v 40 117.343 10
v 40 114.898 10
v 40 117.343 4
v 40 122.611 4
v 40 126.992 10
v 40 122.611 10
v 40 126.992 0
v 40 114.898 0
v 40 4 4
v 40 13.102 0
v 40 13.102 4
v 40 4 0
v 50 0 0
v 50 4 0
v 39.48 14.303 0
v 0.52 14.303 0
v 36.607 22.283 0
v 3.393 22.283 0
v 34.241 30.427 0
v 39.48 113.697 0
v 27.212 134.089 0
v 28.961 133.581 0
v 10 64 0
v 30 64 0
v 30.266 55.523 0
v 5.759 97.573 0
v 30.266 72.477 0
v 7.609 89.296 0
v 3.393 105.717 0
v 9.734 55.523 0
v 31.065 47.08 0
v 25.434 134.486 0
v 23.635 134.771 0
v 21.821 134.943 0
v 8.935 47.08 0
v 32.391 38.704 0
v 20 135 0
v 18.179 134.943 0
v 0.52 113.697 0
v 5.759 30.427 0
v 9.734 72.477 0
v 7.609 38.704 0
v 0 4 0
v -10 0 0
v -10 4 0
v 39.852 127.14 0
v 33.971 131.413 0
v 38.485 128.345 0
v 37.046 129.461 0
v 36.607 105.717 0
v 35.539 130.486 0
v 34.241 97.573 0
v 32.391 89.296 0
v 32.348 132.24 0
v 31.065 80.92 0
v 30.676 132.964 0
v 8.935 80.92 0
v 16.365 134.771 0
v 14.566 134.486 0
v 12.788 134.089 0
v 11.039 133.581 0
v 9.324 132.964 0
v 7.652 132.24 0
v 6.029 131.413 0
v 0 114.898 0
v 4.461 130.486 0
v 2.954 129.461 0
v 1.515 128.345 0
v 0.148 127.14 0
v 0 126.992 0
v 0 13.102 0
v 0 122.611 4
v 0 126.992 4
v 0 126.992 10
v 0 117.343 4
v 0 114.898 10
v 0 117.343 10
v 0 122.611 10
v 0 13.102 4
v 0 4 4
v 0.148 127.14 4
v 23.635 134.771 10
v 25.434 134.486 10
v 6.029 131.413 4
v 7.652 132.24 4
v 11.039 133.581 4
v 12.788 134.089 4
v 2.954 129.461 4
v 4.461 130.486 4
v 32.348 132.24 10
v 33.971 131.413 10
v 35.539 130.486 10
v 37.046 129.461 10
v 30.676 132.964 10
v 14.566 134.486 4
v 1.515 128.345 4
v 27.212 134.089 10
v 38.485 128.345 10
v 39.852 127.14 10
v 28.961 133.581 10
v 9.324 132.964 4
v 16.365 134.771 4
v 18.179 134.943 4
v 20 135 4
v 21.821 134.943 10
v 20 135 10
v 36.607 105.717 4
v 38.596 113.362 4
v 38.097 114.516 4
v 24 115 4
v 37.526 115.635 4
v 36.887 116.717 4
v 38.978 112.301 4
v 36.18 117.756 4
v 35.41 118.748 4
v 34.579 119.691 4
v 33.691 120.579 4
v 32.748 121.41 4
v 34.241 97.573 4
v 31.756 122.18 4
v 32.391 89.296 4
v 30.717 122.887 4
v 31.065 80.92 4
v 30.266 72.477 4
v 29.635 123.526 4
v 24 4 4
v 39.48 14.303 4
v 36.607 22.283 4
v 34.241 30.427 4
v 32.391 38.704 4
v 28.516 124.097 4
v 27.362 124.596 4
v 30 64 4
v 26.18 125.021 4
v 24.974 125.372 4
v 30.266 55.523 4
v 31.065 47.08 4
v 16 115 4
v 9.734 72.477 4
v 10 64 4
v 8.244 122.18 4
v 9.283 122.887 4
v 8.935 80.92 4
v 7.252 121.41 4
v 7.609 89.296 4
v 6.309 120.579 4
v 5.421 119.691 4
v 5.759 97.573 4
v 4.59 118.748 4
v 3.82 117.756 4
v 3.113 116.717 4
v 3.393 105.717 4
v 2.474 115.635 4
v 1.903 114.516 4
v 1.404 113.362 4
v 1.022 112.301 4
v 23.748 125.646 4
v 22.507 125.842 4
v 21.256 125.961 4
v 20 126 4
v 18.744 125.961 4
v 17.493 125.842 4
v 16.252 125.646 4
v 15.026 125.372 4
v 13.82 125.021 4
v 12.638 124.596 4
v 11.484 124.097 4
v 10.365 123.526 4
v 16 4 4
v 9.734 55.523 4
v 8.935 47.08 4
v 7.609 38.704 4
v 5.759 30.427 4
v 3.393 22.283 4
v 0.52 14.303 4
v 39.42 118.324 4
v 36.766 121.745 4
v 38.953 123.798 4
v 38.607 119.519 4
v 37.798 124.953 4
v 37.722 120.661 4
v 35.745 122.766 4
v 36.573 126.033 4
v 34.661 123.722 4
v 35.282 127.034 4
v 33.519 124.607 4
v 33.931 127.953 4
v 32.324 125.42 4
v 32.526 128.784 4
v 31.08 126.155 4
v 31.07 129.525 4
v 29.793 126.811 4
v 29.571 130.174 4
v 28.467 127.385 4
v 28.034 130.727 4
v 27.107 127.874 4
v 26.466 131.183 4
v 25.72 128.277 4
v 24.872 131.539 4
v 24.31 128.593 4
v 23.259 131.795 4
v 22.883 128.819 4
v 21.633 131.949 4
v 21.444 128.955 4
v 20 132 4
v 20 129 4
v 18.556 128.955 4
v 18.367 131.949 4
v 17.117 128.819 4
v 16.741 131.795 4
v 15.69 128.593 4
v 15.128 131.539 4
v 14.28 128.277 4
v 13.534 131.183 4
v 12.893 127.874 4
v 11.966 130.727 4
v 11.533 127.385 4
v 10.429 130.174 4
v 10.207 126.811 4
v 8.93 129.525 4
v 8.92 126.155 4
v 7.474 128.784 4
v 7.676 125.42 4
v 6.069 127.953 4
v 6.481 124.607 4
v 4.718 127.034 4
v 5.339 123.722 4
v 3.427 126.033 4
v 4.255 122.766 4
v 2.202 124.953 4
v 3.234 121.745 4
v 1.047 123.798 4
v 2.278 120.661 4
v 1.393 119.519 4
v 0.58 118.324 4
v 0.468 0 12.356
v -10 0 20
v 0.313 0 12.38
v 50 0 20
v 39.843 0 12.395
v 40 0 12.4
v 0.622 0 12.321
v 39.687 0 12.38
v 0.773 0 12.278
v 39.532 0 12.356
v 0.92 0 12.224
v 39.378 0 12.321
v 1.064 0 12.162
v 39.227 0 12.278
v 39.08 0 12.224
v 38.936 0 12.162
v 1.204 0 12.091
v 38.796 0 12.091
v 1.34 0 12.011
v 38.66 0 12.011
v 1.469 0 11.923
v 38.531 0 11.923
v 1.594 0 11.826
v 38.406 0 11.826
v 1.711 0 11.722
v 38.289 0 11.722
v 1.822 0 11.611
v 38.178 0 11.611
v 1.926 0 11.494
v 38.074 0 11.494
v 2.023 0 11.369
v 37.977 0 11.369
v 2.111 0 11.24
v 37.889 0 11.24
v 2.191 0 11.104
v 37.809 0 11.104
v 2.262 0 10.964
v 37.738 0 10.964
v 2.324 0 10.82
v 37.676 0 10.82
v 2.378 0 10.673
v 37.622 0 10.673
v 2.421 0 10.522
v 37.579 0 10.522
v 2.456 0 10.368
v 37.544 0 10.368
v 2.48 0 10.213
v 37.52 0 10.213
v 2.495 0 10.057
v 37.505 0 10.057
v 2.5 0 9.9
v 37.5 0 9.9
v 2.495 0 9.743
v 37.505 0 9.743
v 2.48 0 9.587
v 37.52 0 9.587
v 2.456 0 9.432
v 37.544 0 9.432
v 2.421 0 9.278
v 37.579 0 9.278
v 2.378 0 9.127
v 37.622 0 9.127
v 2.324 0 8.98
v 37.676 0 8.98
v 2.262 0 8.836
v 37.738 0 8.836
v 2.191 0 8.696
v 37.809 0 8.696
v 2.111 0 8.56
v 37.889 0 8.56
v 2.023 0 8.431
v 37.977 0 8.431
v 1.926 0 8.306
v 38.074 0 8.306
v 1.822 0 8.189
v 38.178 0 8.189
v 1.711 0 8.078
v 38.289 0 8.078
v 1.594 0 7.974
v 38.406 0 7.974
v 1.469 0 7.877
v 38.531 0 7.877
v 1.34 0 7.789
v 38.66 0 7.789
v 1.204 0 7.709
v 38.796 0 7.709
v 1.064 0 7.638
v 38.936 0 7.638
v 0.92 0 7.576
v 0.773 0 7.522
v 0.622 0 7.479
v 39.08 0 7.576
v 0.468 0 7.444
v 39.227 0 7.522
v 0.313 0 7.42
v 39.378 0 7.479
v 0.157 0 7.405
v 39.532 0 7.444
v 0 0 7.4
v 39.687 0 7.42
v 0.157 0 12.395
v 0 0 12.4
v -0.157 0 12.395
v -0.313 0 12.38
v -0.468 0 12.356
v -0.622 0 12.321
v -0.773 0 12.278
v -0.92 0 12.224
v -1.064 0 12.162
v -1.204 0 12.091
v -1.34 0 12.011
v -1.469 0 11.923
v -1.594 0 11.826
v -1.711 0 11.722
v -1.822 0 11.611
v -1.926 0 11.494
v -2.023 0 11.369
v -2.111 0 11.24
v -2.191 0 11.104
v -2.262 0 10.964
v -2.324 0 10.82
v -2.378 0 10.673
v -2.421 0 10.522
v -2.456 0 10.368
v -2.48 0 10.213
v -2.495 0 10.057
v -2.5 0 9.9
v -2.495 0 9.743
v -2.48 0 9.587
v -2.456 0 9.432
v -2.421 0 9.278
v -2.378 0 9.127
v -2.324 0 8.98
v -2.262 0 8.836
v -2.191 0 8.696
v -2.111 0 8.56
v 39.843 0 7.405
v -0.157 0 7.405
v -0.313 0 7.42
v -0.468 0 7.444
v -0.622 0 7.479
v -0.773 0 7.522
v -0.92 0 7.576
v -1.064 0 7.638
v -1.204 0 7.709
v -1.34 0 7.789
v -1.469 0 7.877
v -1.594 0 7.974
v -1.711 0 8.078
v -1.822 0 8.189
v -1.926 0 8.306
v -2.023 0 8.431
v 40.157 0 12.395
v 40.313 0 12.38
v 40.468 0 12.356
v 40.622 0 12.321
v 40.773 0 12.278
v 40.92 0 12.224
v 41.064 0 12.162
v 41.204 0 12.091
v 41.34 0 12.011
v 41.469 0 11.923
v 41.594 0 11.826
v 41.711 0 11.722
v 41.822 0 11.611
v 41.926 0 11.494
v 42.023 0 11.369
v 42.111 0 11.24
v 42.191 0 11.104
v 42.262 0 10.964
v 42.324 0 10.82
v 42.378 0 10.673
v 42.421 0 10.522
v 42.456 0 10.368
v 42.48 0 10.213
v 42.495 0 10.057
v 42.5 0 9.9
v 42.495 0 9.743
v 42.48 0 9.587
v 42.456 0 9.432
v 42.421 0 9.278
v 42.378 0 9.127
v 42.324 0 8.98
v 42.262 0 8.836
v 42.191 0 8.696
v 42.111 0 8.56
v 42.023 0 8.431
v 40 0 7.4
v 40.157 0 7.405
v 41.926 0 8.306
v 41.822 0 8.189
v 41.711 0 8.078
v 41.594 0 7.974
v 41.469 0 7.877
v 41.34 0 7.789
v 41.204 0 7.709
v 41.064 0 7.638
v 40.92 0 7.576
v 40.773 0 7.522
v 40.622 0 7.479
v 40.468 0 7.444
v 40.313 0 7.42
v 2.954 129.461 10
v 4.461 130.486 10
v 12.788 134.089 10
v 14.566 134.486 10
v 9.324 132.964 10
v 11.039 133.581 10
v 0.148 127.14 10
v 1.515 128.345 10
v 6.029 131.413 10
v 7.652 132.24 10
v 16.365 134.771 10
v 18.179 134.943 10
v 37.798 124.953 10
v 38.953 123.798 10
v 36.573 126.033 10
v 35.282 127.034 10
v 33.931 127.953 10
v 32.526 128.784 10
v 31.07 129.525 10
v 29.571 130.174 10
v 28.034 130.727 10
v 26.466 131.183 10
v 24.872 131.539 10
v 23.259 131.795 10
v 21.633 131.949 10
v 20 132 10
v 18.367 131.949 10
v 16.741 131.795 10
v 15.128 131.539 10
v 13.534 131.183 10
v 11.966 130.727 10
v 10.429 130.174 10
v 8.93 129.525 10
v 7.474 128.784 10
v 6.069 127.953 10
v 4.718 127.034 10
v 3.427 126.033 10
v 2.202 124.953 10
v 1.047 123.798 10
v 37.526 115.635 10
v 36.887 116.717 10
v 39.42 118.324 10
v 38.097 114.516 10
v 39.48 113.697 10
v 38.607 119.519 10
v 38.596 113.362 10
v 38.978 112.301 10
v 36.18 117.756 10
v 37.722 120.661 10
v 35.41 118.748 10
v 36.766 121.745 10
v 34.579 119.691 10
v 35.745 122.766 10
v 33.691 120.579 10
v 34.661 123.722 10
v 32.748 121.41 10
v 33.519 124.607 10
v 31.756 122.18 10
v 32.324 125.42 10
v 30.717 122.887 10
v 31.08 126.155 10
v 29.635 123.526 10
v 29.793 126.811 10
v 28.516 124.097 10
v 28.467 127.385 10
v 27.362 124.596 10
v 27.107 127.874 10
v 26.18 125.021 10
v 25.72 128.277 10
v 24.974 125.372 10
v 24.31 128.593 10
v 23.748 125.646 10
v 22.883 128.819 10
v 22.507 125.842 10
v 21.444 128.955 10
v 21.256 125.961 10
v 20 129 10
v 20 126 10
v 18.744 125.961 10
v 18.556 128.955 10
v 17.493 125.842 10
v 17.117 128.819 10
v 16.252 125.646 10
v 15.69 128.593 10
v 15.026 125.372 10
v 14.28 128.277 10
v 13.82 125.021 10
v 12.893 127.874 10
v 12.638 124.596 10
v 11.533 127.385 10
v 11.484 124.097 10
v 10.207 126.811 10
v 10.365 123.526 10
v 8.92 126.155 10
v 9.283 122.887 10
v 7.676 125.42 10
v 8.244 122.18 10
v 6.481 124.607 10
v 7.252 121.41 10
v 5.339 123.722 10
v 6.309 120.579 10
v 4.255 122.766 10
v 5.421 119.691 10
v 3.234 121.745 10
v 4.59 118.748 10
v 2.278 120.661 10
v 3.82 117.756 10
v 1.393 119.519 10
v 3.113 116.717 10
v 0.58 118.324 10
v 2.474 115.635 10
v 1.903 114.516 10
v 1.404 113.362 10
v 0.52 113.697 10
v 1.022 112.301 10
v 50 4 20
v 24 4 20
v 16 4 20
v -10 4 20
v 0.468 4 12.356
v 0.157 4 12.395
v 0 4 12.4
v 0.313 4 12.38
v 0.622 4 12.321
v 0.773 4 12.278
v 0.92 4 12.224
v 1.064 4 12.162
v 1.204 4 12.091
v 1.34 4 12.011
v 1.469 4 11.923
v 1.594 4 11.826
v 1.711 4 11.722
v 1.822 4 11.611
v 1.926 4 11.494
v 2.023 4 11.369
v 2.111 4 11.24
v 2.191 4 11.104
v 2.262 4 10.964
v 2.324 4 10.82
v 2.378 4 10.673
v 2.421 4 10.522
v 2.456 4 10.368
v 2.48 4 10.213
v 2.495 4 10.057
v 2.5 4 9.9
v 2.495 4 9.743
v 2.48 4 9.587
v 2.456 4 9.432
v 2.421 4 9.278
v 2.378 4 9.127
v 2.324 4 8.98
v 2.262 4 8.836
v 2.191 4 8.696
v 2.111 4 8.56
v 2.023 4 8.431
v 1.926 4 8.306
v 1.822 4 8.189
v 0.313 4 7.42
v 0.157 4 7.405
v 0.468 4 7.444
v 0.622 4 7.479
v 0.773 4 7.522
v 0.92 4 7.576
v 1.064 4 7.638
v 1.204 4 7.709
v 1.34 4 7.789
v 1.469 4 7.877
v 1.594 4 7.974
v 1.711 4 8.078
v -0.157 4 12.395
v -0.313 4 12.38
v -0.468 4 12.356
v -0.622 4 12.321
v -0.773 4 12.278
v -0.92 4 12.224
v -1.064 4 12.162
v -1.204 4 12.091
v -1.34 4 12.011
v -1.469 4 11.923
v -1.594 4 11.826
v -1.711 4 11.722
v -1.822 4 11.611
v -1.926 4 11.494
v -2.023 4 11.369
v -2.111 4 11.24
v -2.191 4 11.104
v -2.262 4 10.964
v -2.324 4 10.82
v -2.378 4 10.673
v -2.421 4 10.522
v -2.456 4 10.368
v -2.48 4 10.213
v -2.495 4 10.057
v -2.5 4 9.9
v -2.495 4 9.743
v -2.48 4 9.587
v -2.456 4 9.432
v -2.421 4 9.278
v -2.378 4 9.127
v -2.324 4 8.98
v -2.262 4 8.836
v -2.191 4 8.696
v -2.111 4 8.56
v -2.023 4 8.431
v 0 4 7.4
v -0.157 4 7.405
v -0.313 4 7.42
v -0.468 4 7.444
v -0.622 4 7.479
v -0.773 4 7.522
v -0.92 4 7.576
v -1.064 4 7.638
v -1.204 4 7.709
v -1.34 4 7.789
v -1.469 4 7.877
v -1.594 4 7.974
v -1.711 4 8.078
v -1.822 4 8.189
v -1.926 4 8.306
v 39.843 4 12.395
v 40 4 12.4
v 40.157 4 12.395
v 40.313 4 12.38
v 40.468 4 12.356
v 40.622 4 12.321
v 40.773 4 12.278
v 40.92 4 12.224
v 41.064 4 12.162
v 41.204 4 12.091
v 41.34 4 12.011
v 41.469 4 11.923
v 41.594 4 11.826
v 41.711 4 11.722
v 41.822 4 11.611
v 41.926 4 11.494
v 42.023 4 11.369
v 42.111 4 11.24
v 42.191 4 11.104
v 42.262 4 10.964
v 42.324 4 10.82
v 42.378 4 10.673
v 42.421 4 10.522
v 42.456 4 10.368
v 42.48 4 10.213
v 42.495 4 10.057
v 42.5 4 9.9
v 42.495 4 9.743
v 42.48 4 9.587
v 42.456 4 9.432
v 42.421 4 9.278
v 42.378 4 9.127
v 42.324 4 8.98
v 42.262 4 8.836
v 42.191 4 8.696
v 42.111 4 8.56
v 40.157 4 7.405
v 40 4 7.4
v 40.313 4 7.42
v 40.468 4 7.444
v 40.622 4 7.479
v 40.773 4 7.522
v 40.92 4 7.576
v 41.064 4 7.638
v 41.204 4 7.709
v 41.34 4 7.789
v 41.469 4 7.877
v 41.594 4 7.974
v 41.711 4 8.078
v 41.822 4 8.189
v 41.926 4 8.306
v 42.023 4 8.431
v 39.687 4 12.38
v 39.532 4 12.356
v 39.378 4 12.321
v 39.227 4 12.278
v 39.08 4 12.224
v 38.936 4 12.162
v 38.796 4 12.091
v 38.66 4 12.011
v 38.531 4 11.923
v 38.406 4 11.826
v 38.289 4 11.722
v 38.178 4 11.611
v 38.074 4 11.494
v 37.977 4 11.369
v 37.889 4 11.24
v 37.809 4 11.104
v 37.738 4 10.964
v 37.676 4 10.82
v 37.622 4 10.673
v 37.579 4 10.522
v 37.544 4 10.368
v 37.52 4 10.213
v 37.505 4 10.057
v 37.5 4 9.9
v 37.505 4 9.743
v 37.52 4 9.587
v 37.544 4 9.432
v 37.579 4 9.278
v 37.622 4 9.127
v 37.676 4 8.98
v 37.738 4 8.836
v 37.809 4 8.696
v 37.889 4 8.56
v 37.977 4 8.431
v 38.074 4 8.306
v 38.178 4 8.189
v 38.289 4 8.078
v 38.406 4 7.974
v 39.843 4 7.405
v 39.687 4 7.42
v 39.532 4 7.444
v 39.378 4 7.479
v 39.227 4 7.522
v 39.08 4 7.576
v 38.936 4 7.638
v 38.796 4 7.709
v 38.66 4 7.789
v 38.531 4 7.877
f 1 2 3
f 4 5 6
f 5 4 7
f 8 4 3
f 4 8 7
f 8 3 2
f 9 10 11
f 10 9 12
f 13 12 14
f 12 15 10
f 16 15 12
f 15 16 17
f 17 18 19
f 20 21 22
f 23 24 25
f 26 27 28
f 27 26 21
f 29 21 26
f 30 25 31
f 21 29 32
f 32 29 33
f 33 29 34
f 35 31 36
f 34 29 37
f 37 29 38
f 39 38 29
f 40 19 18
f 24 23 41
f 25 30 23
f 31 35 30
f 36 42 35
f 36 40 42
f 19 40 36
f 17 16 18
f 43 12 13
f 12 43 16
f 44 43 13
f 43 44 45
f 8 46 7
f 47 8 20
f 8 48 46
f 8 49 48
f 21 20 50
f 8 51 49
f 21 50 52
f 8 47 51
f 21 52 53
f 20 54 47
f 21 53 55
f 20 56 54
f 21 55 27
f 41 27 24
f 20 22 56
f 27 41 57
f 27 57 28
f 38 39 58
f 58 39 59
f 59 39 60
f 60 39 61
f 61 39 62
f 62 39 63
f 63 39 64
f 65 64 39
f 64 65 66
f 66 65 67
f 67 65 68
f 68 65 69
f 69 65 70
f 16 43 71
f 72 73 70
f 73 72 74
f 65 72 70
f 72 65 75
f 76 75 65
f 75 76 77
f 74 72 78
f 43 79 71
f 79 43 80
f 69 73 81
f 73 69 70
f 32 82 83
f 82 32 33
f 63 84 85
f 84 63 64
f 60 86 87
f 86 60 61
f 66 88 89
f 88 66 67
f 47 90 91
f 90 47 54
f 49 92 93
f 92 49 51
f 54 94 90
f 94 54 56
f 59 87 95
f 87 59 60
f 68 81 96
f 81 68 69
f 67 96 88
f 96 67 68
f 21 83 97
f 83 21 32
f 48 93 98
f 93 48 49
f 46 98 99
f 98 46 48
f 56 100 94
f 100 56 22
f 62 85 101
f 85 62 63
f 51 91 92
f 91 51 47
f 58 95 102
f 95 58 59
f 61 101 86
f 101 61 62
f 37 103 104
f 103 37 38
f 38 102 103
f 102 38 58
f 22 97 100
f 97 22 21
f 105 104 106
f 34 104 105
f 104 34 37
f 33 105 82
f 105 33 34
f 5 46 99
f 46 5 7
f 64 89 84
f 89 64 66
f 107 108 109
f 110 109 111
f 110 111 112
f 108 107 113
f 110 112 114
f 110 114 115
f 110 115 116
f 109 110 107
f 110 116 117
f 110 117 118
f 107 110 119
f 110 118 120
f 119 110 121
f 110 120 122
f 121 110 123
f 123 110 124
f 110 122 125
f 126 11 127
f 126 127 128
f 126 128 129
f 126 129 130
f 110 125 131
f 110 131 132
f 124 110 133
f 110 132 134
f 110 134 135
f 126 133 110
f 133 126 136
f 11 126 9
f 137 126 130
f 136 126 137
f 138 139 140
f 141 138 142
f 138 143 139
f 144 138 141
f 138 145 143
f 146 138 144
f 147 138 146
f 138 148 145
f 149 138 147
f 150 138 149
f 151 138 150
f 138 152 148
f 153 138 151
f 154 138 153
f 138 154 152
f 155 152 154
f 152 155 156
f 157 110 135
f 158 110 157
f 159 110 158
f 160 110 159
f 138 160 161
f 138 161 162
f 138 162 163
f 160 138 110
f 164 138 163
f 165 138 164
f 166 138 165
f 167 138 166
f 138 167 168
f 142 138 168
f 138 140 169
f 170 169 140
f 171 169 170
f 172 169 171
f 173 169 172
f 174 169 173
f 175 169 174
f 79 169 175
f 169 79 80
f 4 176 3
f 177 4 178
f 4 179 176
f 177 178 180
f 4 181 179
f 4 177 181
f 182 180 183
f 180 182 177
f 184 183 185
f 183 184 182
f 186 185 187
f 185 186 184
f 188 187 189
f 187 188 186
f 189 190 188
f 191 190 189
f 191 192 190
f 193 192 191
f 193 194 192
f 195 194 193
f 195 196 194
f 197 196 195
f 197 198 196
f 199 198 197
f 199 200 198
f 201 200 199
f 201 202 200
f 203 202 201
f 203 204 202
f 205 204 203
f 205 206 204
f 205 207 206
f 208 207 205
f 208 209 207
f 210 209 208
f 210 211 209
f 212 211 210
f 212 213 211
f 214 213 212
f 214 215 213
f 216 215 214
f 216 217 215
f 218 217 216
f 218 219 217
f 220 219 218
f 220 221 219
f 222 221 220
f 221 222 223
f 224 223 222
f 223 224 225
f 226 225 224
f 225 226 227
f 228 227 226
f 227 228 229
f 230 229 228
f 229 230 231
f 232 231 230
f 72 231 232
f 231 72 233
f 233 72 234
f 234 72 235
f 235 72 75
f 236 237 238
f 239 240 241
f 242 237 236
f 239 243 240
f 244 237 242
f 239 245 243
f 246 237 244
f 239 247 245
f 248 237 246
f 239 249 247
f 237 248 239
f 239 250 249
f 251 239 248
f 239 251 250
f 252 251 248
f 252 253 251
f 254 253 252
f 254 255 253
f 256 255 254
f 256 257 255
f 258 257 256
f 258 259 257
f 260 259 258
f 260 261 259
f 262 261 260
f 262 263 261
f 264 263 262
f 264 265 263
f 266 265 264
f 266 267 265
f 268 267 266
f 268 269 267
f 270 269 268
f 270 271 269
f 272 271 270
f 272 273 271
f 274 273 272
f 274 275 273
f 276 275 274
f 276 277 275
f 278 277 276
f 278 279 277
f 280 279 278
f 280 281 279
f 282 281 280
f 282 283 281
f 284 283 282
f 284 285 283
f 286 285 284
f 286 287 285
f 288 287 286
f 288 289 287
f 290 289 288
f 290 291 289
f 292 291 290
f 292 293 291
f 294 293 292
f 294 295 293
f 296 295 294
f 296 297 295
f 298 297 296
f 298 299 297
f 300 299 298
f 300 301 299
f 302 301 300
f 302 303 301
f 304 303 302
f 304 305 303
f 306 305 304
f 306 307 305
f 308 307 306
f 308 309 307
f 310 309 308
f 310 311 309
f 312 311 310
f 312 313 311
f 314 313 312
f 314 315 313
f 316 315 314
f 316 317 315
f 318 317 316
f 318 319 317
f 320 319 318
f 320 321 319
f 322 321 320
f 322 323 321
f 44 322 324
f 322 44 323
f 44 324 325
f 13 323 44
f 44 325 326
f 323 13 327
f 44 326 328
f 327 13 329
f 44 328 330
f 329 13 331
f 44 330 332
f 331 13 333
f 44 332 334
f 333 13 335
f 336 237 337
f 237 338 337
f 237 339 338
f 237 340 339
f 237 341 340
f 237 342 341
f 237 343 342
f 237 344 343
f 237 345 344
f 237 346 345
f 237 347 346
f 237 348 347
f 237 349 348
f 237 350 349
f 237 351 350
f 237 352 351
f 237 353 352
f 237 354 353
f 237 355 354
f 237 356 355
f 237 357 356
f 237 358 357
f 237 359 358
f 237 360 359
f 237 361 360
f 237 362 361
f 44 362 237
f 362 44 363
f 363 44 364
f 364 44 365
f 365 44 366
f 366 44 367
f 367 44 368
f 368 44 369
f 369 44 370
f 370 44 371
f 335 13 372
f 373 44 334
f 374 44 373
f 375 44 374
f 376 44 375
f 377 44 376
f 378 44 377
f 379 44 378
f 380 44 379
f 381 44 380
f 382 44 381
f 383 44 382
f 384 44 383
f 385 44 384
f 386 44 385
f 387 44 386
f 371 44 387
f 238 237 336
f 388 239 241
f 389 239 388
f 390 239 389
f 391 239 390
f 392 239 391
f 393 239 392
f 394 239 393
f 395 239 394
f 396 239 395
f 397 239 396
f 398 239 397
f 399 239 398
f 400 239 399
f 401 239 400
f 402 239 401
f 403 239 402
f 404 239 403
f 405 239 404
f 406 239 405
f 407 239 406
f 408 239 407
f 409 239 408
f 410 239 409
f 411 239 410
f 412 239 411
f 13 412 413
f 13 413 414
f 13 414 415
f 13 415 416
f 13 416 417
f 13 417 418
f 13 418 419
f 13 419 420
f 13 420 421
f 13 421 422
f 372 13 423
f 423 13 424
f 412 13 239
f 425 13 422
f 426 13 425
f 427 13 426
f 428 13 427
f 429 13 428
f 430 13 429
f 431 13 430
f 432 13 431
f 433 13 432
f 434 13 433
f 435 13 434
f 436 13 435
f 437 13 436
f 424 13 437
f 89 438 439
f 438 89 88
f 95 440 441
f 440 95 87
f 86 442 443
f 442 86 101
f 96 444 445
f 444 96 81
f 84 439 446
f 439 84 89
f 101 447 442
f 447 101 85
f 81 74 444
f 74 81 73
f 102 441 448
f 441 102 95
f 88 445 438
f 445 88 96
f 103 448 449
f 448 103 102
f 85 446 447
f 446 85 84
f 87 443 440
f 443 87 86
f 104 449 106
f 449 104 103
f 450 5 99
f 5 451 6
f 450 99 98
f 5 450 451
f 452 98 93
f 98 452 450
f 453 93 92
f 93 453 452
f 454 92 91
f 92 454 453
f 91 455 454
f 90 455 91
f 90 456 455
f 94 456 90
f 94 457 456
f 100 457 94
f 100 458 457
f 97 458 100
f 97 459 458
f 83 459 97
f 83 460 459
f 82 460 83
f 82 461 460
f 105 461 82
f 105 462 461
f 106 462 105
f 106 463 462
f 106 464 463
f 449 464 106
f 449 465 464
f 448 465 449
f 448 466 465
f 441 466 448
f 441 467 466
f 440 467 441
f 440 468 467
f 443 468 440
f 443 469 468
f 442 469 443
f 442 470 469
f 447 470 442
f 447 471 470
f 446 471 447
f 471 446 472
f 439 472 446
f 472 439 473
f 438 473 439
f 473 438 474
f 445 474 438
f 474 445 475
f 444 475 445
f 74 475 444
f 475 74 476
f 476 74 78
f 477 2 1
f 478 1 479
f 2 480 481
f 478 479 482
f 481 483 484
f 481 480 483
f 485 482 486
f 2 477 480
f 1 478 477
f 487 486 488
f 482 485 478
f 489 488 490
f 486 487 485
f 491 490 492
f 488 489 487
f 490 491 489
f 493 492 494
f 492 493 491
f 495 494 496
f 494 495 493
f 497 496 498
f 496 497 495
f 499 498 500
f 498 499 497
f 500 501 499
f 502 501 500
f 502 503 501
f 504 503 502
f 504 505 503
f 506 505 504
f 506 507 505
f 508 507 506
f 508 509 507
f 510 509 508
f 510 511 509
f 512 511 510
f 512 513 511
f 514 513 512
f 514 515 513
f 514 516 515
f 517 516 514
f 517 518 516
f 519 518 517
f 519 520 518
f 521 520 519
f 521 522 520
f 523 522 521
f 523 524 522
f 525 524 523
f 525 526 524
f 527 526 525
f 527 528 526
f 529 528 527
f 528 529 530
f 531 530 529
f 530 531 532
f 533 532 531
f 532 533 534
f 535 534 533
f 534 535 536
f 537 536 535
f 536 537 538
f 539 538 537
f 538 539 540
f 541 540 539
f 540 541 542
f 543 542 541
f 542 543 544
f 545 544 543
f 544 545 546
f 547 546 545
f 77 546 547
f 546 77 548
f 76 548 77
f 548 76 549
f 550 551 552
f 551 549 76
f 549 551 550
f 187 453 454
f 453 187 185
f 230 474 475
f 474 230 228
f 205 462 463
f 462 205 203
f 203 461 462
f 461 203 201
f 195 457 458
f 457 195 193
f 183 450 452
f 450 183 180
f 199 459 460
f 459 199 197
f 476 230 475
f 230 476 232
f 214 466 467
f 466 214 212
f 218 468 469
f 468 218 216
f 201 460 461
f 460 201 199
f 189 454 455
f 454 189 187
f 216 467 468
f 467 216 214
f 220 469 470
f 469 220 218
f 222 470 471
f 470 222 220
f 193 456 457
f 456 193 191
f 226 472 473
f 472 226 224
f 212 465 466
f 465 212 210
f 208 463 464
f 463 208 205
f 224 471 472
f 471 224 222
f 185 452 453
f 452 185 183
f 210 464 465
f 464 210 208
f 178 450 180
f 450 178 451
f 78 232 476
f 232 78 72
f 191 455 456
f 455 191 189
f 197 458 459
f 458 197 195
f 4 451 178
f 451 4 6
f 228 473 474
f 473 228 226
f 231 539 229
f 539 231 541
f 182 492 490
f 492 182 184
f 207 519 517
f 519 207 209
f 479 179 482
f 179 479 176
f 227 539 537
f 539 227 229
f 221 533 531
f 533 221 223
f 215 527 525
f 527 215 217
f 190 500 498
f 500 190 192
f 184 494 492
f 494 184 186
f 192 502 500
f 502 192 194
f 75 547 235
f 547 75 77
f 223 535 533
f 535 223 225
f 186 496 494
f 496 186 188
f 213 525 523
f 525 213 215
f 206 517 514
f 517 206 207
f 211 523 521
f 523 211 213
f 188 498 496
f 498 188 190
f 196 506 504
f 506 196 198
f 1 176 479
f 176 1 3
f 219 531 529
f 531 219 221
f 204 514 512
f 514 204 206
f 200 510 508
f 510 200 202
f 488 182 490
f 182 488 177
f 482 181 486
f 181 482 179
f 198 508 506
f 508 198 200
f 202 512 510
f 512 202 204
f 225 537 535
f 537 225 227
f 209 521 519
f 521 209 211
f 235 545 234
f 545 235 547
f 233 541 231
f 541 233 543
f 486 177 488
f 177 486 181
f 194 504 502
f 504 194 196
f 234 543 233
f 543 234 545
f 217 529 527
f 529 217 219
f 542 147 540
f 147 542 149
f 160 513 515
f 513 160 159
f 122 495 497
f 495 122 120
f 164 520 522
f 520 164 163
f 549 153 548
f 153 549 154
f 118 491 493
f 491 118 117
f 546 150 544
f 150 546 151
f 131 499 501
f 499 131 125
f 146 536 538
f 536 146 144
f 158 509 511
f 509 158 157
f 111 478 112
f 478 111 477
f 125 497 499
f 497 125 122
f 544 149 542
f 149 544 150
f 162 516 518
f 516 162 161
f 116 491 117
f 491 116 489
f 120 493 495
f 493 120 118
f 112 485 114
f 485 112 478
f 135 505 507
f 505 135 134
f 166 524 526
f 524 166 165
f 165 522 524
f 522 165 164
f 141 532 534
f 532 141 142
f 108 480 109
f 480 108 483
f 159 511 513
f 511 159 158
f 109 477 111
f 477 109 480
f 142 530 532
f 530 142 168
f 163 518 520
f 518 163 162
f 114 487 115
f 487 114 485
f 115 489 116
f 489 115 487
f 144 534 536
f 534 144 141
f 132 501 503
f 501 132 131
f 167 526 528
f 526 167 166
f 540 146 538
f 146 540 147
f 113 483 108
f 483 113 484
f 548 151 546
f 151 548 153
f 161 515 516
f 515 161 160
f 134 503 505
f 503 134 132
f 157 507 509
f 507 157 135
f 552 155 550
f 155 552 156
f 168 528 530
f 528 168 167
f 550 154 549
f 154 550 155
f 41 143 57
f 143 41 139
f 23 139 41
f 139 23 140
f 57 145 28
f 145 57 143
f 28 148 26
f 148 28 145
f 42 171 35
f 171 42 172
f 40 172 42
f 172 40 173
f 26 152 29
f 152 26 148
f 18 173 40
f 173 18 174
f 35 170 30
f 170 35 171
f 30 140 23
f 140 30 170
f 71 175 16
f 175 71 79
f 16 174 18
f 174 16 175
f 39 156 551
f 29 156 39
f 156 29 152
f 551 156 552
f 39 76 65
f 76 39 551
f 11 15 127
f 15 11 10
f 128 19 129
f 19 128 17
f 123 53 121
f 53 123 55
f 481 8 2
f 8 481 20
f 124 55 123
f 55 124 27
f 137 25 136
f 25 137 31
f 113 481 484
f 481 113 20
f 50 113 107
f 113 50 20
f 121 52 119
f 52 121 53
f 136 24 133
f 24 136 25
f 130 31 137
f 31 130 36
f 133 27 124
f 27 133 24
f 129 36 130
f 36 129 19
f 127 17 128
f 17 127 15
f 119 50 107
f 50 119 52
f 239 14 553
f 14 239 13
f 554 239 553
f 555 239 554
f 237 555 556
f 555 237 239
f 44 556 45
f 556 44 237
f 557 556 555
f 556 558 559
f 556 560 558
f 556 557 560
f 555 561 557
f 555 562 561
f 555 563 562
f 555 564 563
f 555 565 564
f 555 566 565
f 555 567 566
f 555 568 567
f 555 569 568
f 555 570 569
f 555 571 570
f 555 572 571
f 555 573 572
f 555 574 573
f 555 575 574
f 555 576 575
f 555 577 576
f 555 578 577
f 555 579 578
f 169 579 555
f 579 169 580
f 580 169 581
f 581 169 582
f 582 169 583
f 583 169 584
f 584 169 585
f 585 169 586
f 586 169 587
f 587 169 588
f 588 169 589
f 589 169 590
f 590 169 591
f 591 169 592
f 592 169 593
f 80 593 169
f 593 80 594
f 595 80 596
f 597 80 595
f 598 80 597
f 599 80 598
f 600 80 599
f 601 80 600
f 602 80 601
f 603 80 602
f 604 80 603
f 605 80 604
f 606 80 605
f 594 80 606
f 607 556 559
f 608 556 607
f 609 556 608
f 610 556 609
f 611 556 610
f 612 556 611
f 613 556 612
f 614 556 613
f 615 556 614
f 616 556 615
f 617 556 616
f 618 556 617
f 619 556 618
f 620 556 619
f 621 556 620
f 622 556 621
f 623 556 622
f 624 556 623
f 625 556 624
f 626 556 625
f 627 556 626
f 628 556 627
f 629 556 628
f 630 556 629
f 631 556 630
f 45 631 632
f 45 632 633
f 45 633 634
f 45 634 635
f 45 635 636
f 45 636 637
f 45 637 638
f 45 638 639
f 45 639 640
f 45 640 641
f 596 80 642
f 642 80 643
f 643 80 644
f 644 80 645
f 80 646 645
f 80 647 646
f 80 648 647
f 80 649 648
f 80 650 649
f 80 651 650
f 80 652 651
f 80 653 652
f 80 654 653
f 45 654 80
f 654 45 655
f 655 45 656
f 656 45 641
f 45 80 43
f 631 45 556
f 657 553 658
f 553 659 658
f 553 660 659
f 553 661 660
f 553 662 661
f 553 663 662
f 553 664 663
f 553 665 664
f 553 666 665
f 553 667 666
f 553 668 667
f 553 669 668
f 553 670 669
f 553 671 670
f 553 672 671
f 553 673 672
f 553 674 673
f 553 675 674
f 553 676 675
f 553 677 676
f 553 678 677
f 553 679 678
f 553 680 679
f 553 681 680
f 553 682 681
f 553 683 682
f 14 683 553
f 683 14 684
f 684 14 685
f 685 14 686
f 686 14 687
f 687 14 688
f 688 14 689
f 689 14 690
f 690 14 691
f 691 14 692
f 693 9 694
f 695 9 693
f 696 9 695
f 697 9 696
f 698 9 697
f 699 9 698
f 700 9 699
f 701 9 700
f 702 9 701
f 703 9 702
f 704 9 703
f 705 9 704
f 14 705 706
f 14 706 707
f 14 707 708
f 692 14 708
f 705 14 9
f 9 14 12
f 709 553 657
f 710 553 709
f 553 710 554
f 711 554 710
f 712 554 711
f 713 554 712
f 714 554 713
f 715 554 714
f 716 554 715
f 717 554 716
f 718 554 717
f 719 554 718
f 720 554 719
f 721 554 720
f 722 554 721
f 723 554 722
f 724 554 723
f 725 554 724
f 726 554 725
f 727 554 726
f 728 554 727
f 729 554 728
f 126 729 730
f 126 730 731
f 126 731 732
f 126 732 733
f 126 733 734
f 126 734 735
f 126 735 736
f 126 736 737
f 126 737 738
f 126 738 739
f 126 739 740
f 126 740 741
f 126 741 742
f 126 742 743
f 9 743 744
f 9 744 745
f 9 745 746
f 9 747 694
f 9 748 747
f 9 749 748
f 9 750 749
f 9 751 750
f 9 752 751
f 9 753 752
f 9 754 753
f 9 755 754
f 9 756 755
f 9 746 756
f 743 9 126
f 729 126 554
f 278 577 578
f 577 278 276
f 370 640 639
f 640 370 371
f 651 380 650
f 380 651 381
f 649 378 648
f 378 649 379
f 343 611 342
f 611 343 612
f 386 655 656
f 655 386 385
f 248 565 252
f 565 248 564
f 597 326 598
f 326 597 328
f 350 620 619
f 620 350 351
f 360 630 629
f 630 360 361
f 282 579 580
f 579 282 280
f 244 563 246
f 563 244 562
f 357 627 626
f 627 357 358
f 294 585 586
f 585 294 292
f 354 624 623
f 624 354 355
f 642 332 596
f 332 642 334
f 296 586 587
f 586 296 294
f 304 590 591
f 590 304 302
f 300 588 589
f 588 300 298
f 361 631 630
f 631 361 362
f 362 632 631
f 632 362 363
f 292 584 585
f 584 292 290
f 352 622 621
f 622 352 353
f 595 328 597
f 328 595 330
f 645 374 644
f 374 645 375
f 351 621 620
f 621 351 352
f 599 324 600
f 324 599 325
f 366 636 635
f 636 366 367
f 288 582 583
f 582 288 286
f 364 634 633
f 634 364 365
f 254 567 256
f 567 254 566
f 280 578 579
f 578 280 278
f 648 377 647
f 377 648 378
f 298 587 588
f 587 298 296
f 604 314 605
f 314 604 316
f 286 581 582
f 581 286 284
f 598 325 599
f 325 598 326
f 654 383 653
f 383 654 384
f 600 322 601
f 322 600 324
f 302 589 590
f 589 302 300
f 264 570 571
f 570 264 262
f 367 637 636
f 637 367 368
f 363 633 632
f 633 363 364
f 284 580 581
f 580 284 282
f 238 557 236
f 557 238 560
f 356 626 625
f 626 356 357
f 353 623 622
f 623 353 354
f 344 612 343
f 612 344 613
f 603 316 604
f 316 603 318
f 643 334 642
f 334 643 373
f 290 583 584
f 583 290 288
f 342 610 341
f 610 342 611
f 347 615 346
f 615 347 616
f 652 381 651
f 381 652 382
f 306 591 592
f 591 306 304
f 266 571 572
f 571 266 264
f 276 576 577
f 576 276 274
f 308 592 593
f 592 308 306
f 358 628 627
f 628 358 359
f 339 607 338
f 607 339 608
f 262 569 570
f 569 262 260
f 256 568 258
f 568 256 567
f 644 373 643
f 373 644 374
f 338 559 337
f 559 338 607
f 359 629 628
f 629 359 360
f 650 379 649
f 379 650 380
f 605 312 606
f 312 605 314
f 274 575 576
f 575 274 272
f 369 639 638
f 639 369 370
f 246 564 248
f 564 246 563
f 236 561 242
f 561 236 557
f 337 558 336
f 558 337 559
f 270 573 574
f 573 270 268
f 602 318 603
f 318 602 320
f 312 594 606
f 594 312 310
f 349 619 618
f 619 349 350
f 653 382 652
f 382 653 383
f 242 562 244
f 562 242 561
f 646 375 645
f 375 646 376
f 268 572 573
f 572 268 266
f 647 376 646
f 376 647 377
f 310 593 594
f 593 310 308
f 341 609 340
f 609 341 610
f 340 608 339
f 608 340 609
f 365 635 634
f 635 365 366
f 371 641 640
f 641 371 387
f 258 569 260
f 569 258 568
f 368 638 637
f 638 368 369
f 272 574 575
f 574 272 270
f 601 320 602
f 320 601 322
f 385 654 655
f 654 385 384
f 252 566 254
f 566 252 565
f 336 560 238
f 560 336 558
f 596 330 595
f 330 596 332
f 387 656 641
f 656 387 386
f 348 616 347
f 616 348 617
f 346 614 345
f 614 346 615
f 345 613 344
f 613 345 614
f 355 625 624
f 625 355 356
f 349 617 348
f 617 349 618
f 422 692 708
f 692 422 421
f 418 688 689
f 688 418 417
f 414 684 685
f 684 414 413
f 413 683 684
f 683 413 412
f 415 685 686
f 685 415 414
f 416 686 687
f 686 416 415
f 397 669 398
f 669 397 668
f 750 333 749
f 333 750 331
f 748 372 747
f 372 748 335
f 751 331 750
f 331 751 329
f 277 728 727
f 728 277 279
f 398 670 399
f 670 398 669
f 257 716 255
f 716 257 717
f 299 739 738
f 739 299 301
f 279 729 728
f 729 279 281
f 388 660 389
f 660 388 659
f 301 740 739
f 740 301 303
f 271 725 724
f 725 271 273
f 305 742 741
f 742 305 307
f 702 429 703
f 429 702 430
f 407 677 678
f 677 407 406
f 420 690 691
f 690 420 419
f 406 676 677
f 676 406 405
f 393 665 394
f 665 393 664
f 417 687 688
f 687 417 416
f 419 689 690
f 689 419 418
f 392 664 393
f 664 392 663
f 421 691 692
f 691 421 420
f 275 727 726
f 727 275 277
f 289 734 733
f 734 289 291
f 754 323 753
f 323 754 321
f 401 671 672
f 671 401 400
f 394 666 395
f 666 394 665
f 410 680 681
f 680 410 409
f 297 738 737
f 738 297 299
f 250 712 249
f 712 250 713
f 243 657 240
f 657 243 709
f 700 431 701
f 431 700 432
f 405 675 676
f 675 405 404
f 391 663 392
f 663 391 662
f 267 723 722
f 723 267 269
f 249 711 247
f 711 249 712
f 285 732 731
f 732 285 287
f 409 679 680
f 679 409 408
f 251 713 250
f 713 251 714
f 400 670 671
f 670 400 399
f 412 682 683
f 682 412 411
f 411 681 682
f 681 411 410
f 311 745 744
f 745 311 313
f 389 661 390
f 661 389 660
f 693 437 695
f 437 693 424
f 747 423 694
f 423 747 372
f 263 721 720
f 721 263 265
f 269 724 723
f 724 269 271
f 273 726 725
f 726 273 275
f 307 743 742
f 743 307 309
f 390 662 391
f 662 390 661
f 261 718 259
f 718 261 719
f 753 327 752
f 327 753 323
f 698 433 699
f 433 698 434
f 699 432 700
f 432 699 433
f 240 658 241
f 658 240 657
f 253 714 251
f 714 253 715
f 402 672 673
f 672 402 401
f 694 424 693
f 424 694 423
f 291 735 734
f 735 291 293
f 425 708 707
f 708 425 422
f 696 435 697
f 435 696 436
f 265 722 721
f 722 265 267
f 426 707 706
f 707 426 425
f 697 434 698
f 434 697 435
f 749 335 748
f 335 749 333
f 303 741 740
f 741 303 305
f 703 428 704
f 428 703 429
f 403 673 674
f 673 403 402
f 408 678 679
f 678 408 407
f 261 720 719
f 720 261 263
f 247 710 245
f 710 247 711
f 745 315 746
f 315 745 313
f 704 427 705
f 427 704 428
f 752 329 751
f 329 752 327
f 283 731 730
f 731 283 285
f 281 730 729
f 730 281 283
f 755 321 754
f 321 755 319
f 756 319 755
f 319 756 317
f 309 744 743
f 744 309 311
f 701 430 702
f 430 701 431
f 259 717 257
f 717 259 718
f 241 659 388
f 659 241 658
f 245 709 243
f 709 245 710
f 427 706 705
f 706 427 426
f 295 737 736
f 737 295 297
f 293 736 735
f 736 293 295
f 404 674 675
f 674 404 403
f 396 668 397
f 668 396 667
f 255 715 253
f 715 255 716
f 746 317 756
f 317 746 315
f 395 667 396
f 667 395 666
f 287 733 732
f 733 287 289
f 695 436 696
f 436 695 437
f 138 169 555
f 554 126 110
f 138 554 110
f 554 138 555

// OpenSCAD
// file: functions.scad
/**********************************
	File: functions.scad
	Revision: 0.2 (2/3/2012)
	OpenSCAD version by:
	Michael Williams (gannon)
	mswillia@mtu.edu
**********************************/
include <config.scad>

//Drill a hole the given depth at the given location
module drill(x,y,radius,depth) {
	translate([x,y,-overdrill])
		cylinder(r=radius,h=depth,$fn=100);
}

module roundedcorner(radius,thickness,angle) {
	rotate([0,0,angle])
		translate([-radius+overdrill,-radius+overdrill,-overdrill])
			difference() {
				translate([-overdrill,-overdrill,0])
					cube([radius+overdrill,radius+overdrill,thickness+overdrill*2]);
				cylinder(r=radius,h=thickness+overdrill*2, $fn=100);
			}
}

module Lbracket(height,width,length,thickness) {
	difference() {
		cube([height+thickness,width+thickness,length]);
		translate([thickness,thickness,-overdrill])
			cube([width+thickness,height+thickness,length+overdrill*2]);
	}
}

//Usage: points is an array consisting of elements
//[x,y,r] for each point of the polygon
//Please note that x and y will be the centers
//of the rounded edges! Outside wall will be
//r away at some angle.
//Ideally I will make a function that will find
//the place to put the circle of a given radius
//based off of the points in the polygon.
module multiradiusroundedpoly(points,height) {
	linear_extrude(height=height)
		hull()
			for (p = points) {
				translate([p[0],p[1],0])
					circle(r=p[2],$fn=100);
			}
}

module bearing_block_holes() {
	make_4_holes(bearing_block_base[0]-11, bearing_block_base[1]-9, bearing_block_base[2],screw_b_diameter/2);
}

module make_4_holes(width,height,depth,radius) {
	translate([width/2, height/2,0])
		for (i=[-1,1],j=[-1,1]) {
			translate([i*width/2, j*height/2, 0])
				drill(0,0, radius, depth+overdrill*2);
		}
}

module x_axis_bearing_mount() {
	difference() {
		cube(bearing_mount_base);
		
		//Rounded corners
		for (i=[0,1],j=[0,1]) {
			translate([i*bearing_mount_base[0],j*bearing_mount_base[1],0])
				if (i==1 && j==1)
					roundedcorner(bearing_mount_corner,bearing_mount_base[2],0);
				else
					roundedcorner(bearing_mount_corner,bearing_mount_base[2],180+i*90-j*90);
		}
		

		//Middle cutout
		translate([(bearing_mount_base[0]-bearing_mount_hole[0])/2,(bearing_mount_base[1]-bearing_mount_hole[1])/2,-overdrill])
			cube(bearing_mount_hole);
			
		//Bearing mounts
		translate([bearing_mount_base[0]-bearing_block_base[0]+10.5+screw_b_diameter/2,bearing_block_base[0]-4.5+screw_b_diameter/2,0])
			rotate([0,0,-90])
				bearing_block_holes();

		translate([6,bearing_block_base[0]-4.5+screw_b_diameter/2,0])
			rotate([0,0,-90])
				bearing_block_holes();
		
		//Middle 4 holes
		translate([44.5,4,0])
			make_4_holes(bearing_mount_base[0]-89,bearing_mount_base[1]-8,bearing_mount_base[2],screw_b_diameter/2);

	}
}
// file: config.scad
/**********************************
	File: config.scad
	Revision: 0.3 (2/3/2013)
	OpenSCAD version by:
	Michael Williams (gannon)
	mswillia@mtu.edu
**********************************/

/**********************************
	GENERAL CONFIGURATION
**********************************/
//This is for the depth of holes so OpenSCAD renders correctly.
overdrill=0.1;

//LM10UU
linear_bearing_length=29;
linear_bearing_ID=10;
linear_bearing_OD=19.4;//19

//HFSB5-2020 extrusions
extrusion_height=20;
extrusion_width=20;
extrusion_wall=3.2;
extrusion_opening=5.4;

//Large rods
smooth_rod_diameter=10;
threaded_rod_diameter=8;

//608zz
skate_bearings_length=7;
skate_bearings_ID=8;
skate_bearings_OD=22;

//Belt configuration
belt_width=8;
belt_depth=1;

/*
3/8"-12 acme rod
m8 threaded rod
*/

spring_OD=6;

screw_a_diameter=3;
screw_b_diameter=4;
screw_c_diameter=5;
screw_d_diameter=8;

/**********************************
	AUTO CONFIGURATION
**********************************/

//Bearing block
bearing_block_base = [linear_bearing_OD*2+5,linear_bearing_length+5,7];

//X Axis
bearing_mount_corner = 6;
bearing_mount_base = [114,bearing_block_base[0]+3.7,6];
bearing_mount_hole = [bearing_mount_base[0]-12,bearing_mount_base[1]-27.5,bearing_mount_base[2]+overdrill*2];

/**********************************
	END CONFIGURATION
**********************************/
// main file
/**********************************
	File: FilamentGuide.scad
	Revision: 0.3(2/24/2013)
	OpenSCAD version by:
	Michael Williams (gannon)
	mswillia@mtu.edu
**********************************/
include <config.scad>
use <functions.scad>
/**********************************
		CONFIGURATION
**********************************/
base = [40,135,4];
mount = [base[0]+20,base[2],20];
support_thickness = 8;

/**********************************
		END CONFIGURATION
**********************************/
union() {

difference() {
	union() {
		difference() {
			cube(base);
			difference() {
				translate([0,base[1]-40,0])
					cube([40,40,10]);
				translate([20,base[1]-29,0])
					cylinder(r=29,h=10, $fn=100);
			}
		}
		
		translate([20,base[1]-29,0]) 
			intersection() {
				union() {
					difference() {
						cylinder(r=29,h=10, $fn=100);
						cylinder(r=26,h=10+overdrill, $fn=100);
					}
					difference() {
						cylinder(r=23,h=10, $fn=100);
						cylinder(r=20,h=10+overdrill, $fn=100);
					}
				}
				translate([-20,0,0])
					cube([40,40,10]);
			}
			
	}
	translate([-125,base[1]/2 - 3.5,-overdrill])
		cylinder(r=base[1],h=10+overdrill*2,$fn=100);
	translate([125+base[0],base[1]/2 - 3.5,-overdrill])
		cylinder(r=base[1],h=10+overdrill*2,$fn=100);
}

difference() {
	translate([-((mount[0] - base[0]) / 2), 0, 0 ])
		cube(mount);
	rotate([-90,0,0]) drill(0, -mount[2]/2+overdrill, screw_c_diameter/2, mount[1]+overdrill*2);
	rotate([-90,0,0]) drill(mount[0]-20, -mount[2]/2+overdrill, screw_c_diameter/2, mount[1]+overdrill*2);
}

translate([(base[0]+support_thickness)/2,0,0])
	rotate([0,-90,0])
		linear_extrude(height = support_thickness)
			polygon(points=[[base[2]-overdrill,mount[1]],[base[2],mount[1]],[mount[2],mount[1]],[base[2],base[1]-mount[2]],[base[2]-overdrill,base[1]-mount[2]]],paths=[[0,1,2,3,4]]);


}
